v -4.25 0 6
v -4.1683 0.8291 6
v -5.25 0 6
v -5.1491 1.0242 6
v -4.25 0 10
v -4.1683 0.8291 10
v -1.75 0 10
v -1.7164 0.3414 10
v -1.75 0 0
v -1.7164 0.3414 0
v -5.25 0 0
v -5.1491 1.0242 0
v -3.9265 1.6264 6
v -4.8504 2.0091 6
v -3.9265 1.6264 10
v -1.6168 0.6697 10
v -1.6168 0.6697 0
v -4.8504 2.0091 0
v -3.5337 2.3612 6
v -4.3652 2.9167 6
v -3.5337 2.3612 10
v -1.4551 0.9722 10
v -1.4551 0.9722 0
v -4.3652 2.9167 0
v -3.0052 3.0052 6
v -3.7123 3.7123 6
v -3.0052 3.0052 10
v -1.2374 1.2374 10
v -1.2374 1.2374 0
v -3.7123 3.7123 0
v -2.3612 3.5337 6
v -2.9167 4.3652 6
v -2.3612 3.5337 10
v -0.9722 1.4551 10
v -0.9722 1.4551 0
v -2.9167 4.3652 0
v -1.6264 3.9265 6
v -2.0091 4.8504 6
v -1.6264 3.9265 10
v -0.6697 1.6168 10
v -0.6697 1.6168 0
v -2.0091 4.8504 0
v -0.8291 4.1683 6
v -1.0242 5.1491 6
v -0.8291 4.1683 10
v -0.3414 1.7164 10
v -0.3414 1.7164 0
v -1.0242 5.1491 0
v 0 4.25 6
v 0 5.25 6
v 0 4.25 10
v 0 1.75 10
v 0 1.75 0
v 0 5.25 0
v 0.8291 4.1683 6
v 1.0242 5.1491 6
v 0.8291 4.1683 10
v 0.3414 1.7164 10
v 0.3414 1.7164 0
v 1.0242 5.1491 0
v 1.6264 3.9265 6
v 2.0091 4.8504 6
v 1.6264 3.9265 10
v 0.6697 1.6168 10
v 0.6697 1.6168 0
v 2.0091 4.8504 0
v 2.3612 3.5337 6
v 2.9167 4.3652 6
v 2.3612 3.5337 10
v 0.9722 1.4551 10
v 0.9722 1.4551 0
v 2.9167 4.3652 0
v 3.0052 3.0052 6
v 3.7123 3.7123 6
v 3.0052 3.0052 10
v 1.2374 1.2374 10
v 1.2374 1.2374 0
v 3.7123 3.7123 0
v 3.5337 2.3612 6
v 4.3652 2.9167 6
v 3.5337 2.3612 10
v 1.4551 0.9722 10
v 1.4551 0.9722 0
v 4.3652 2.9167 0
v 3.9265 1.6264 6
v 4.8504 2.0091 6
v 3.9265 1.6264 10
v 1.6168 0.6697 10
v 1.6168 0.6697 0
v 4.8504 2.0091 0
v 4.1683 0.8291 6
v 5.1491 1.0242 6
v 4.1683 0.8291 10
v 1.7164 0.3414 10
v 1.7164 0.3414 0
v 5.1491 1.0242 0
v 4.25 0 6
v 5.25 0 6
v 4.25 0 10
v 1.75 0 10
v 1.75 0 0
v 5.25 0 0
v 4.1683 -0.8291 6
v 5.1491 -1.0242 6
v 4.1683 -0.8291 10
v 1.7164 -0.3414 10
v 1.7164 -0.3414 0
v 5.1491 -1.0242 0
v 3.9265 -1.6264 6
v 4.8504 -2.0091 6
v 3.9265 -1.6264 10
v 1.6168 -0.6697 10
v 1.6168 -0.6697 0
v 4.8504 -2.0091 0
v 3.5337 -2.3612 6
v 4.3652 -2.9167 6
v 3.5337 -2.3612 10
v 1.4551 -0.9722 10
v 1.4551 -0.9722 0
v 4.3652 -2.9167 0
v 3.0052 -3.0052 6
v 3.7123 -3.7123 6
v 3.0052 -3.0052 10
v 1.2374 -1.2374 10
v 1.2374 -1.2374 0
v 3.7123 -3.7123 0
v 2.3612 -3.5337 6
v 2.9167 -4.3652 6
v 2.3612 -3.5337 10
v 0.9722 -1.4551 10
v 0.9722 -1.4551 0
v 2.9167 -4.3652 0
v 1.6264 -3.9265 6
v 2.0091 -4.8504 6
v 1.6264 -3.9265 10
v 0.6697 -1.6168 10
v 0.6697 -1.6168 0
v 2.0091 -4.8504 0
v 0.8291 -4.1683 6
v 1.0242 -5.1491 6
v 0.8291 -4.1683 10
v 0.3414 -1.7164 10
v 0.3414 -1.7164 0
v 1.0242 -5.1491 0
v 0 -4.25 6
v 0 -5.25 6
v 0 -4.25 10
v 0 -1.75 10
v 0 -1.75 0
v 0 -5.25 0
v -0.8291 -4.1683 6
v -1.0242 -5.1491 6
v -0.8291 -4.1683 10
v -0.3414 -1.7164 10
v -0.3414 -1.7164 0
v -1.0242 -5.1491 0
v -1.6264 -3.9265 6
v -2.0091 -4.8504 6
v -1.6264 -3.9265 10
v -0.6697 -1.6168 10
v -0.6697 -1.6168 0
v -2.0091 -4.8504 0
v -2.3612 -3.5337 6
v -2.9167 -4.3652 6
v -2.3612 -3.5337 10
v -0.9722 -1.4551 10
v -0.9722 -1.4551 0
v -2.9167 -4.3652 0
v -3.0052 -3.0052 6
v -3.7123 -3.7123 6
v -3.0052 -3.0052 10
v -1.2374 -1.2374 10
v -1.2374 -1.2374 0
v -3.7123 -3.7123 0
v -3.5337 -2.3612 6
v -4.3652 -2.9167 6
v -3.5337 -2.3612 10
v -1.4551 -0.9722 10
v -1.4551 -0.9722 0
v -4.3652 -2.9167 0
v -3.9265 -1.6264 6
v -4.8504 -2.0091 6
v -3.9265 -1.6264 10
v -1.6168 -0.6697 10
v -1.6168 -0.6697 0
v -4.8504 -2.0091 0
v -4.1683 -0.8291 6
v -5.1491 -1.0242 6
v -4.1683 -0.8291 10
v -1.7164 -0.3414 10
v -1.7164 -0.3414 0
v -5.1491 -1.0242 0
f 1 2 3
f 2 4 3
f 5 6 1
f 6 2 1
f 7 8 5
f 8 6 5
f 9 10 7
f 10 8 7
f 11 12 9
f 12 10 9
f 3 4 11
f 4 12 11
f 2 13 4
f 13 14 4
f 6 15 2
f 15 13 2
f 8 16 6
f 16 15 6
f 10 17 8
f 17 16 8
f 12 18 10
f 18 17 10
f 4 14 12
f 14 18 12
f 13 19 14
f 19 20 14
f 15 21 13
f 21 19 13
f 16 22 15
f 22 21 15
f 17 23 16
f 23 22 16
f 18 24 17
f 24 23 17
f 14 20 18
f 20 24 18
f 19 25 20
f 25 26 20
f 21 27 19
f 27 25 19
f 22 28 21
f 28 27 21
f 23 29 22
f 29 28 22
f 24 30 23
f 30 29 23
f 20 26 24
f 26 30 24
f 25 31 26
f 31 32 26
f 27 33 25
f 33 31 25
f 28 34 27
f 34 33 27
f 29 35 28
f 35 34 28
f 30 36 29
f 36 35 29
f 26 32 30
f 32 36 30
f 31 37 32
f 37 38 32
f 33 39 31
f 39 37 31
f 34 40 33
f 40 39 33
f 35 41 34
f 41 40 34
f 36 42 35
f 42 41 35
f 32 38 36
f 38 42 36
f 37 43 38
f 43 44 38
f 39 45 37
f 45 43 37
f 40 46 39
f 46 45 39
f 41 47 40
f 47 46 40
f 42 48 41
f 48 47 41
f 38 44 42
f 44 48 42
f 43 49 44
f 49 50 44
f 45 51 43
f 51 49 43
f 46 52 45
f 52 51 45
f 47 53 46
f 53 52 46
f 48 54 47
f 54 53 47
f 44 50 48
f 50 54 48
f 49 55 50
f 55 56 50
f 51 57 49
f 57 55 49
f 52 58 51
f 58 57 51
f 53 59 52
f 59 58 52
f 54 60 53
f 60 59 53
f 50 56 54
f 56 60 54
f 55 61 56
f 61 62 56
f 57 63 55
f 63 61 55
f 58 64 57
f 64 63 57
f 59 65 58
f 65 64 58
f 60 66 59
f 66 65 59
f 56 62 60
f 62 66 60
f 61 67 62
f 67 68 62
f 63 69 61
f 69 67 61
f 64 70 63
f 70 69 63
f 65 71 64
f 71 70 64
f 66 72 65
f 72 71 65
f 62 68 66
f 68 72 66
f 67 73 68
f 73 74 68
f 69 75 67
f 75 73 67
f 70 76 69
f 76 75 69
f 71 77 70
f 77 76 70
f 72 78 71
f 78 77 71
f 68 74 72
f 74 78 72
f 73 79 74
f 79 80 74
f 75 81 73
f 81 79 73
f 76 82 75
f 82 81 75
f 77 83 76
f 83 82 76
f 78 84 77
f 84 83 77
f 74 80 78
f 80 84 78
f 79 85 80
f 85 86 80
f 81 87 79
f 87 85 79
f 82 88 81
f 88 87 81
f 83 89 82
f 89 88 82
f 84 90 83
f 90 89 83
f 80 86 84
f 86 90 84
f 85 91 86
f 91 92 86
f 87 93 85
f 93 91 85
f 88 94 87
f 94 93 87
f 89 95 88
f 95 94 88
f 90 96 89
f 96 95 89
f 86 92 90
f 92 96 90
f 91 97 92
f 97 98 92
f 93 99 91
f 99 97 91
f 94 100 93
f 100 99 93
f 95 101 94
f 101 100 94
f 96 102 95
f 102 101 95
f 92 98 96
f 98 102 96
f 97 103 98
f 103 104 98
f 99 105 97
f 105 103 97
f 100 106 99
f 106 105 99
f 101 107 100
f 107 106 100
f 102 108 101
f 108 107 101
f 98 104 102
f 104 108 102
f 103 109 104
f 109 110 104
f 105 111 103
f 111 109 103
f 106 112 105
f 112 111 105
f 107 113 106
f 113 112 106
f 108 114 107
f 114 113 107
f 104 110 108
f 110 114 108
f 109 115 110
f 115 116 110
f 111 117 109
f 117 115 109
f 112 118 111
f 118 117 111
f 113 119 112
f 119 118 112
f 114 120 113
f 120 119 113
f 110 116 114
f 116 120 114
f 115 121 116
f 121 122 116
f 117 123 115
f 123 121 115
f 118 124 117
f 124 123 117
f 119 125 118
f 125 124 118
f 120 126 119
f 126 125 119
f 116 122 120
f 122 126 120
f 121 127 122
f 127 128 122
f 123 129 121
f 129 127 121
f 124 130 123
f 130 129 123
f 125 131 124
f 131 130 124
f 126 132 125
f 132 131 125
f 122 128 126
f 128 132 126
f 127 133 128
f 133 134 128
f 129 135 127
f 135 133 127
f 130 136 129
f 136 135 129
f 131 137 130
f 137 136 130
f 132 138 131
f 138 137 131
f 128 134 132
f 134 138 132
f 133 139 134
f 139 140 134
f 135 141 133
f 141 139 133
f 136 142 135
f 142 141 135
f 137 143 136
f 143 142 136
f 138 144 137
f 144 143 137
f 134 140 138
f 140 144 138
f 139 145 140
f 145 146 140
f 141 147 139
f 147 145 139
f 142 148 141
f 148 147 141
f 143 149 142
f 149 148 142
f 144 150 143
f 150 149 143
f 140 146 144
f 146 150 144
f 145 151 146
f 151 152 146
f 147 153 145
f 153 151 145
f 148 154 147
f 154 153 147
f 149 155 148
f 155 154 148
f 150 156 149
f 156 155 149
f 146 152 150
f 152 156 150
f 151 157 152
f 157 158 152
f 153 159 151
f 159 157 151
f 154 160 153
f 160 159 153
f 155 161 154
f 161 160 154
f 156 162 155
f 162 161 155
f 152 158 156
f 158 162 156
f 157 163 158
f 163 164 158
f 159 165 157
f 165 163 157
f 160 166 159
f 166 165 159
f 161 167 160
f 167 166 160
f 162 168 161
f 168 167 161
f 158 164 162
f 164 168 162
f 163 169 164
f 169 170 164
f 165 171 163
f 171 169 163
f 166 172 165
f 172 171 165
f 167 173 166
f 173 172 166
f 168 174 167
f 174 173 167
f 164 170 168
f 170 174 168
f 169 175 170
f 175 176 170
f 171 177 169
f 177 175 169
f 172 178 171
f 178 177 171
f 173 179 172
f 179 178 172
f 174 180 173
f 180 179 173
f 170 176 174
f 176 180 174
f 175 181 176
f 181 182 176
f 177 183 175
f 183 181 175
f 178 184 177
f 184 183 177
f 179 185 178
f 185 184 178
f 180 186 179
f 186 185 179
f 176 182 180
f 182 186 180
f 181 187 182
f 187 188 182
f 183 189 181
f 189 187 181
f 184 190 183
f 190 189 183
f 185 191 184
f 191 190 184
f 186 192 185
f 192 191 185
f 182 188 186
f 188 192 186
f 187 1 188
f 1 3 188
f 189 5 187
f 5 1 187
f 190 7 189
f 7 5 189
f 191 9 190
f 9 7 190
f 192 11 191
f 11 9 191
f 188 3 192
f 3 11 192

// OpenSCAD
$fn = 32;

// ----------------------------------------------------------------------
// Form washer: stepped_c washer, 10.5 mm outside, 3.5 mm bore
// ----------------------------------------------------------------------

// --- parameters (mm) ---
revolve_angle = 360;      // full turn around the Z axis
profile_points = 6;       // points of the closed outline

profile = [[1.75, 0], [5.25, 0], [5.25, 6], [4.25, 6], [4.25, 10], [1.75, 10]];  // single closed polygon, 6 points, counter clockwise

// --- the one profile operation ---
rotate_extrude(angle = revolve_angle) polygon(points = profile);
